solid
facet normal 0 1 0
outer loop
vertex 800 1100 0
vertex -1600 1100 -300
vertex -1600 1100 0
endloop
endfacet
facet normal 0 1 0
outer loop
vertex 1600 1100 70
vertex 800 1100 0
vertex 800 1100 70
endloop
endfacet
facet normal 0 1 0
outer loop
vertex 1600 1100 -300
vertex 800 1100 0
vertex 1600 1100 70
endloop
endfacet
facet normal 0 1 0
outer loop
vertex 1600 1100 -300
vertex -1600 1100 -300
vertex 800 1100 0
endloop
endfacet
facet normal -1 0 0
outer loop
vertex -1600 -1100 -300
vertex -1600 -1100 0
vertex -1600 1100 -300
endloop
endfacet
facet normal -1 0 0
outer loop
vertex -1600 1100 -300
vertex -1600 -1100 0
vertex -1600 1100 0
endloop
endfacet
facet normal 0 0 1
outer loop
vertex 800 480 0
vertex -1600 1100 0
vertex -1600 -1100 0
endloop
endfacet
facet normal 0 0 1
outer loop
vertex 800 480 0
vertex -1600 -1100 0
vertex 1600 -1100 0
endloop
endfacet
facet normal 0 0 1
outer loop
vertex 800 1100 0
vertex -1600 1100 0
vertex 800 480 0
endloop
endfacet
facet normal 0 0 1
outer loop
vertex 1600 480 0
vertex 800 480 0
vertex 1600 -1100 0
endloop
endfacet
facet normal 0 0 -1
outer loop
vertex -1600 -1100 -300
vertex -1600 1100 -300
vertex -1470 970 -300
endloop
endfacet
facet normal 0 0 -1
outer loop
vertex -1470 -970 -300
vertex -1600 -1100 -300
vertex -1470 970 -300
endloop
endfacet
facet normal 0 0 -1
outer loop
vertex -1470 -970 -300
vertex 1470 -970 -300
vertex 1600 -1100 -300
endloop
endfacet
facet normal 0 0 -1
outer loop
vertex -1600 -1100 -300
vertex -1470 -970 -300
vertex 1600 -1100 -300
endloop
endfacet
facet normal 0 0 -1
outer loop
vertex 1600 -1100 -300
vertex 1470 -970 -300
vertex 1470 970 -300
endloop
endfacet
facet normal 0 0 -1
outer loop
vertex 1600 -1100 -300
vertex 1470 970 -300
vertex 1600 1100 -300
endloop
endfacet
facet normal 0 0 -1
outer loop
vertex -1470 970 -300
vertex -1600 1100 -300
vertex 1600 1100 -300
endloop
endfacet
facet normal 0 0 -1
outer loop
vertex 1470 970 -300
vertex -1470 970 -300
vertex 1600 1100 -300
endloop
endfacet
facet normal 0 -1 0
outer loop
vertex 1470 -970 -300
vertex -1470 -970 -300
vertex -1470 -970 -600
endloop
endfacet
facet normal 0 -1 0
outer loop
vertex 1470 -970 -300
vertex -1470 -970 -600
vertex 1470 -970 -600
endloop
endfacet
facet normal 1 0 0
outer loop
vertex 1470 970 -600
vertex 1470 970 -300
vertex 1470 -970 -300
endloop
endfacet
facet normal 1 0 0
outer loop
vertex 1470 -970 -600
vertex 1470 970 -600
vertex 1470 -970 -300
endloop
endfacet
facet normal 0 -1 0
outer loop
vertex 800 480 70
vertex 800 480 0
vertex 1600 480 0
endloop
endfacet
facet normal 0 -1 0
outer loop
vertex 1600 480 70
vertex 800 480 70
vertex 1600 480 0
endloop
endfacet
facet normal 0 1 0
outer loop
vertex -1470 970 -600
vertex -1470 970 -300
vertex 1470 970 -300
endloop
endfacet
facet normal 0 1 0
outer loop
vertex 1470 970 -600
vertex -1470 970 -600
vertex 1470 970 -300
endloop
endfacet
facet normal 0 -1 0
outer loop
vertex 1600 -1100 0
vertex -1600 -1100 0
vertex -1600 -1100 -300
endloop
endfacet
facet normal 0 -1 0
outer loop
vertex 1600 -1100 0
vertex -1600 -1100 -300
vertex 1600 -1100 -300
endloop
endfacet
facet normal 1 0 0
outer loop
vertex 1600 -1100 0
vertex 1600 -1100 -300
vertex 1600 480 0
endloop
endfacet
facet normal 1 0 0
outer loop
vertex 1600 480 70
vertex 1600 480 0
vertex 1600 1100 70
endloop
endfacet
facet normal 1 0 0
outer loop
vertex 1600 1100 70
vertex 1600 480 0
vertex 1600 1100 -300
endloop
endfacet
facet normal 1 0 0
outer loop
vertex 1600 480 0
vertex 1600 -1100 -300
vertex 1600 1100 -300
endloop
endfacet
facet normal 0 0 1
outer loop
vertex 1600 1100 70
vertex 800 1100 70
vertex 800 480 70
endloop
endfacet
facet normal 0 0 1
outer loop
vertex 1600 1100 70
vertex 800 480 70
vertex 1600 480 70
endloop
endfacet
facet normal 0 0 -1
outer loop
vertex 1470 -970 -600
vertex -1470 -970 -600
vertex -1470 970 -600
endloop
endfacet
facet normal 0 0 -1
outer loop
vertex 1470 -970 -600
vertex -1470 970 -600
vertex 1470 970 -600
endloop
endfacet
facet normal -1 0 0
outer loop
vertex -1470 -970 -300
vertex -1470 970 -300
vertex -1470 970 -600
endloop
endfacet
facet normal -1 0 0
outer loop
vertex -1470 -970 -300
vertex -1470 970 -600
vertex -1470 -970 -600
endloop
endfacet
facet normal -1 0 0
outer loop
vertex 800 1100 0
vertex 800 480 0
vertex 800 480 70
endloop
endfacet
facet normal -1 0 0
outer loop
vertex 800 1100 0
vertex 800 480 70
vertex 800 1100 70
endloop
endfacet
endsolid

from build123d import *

# Parameters (mm, degrees)
F0_W     = 3200
F0_H     = 2200
F1_DEPTH = 300
F2_W     = 2940.000058
F2_H     = 1940.000058
F3_DEPTH = 300
F4_W     = 800
F4_H     = 620
F5_DEPTH = 70


with BuildPart() as f1:
    # F0 (on Top) → F1 (new body)
    with BuildSketch(Plane.XY):
        Rectangle(F0_W, F0_H)
    extrude(amount=-F1_DEPTH)

    # F2 (on face) → F3 (join)
    with BuildSketch(Plane(origin=(0, 0, -300), x_dir=(1, 0, 0), z_dir=(0, 0, -1))):
        Rectangle(F2_W, F2_H)
    extrude(amount=F3_DEPTH)

    # F4 (on face) → F5 (join)
    with BuildSketch(Plane.XY):
        with Locations((1200, 790)):
            Rectangle(F4_W, F4_H)
    extrude(amount=F5_DEPTH)


solid = f1.part
